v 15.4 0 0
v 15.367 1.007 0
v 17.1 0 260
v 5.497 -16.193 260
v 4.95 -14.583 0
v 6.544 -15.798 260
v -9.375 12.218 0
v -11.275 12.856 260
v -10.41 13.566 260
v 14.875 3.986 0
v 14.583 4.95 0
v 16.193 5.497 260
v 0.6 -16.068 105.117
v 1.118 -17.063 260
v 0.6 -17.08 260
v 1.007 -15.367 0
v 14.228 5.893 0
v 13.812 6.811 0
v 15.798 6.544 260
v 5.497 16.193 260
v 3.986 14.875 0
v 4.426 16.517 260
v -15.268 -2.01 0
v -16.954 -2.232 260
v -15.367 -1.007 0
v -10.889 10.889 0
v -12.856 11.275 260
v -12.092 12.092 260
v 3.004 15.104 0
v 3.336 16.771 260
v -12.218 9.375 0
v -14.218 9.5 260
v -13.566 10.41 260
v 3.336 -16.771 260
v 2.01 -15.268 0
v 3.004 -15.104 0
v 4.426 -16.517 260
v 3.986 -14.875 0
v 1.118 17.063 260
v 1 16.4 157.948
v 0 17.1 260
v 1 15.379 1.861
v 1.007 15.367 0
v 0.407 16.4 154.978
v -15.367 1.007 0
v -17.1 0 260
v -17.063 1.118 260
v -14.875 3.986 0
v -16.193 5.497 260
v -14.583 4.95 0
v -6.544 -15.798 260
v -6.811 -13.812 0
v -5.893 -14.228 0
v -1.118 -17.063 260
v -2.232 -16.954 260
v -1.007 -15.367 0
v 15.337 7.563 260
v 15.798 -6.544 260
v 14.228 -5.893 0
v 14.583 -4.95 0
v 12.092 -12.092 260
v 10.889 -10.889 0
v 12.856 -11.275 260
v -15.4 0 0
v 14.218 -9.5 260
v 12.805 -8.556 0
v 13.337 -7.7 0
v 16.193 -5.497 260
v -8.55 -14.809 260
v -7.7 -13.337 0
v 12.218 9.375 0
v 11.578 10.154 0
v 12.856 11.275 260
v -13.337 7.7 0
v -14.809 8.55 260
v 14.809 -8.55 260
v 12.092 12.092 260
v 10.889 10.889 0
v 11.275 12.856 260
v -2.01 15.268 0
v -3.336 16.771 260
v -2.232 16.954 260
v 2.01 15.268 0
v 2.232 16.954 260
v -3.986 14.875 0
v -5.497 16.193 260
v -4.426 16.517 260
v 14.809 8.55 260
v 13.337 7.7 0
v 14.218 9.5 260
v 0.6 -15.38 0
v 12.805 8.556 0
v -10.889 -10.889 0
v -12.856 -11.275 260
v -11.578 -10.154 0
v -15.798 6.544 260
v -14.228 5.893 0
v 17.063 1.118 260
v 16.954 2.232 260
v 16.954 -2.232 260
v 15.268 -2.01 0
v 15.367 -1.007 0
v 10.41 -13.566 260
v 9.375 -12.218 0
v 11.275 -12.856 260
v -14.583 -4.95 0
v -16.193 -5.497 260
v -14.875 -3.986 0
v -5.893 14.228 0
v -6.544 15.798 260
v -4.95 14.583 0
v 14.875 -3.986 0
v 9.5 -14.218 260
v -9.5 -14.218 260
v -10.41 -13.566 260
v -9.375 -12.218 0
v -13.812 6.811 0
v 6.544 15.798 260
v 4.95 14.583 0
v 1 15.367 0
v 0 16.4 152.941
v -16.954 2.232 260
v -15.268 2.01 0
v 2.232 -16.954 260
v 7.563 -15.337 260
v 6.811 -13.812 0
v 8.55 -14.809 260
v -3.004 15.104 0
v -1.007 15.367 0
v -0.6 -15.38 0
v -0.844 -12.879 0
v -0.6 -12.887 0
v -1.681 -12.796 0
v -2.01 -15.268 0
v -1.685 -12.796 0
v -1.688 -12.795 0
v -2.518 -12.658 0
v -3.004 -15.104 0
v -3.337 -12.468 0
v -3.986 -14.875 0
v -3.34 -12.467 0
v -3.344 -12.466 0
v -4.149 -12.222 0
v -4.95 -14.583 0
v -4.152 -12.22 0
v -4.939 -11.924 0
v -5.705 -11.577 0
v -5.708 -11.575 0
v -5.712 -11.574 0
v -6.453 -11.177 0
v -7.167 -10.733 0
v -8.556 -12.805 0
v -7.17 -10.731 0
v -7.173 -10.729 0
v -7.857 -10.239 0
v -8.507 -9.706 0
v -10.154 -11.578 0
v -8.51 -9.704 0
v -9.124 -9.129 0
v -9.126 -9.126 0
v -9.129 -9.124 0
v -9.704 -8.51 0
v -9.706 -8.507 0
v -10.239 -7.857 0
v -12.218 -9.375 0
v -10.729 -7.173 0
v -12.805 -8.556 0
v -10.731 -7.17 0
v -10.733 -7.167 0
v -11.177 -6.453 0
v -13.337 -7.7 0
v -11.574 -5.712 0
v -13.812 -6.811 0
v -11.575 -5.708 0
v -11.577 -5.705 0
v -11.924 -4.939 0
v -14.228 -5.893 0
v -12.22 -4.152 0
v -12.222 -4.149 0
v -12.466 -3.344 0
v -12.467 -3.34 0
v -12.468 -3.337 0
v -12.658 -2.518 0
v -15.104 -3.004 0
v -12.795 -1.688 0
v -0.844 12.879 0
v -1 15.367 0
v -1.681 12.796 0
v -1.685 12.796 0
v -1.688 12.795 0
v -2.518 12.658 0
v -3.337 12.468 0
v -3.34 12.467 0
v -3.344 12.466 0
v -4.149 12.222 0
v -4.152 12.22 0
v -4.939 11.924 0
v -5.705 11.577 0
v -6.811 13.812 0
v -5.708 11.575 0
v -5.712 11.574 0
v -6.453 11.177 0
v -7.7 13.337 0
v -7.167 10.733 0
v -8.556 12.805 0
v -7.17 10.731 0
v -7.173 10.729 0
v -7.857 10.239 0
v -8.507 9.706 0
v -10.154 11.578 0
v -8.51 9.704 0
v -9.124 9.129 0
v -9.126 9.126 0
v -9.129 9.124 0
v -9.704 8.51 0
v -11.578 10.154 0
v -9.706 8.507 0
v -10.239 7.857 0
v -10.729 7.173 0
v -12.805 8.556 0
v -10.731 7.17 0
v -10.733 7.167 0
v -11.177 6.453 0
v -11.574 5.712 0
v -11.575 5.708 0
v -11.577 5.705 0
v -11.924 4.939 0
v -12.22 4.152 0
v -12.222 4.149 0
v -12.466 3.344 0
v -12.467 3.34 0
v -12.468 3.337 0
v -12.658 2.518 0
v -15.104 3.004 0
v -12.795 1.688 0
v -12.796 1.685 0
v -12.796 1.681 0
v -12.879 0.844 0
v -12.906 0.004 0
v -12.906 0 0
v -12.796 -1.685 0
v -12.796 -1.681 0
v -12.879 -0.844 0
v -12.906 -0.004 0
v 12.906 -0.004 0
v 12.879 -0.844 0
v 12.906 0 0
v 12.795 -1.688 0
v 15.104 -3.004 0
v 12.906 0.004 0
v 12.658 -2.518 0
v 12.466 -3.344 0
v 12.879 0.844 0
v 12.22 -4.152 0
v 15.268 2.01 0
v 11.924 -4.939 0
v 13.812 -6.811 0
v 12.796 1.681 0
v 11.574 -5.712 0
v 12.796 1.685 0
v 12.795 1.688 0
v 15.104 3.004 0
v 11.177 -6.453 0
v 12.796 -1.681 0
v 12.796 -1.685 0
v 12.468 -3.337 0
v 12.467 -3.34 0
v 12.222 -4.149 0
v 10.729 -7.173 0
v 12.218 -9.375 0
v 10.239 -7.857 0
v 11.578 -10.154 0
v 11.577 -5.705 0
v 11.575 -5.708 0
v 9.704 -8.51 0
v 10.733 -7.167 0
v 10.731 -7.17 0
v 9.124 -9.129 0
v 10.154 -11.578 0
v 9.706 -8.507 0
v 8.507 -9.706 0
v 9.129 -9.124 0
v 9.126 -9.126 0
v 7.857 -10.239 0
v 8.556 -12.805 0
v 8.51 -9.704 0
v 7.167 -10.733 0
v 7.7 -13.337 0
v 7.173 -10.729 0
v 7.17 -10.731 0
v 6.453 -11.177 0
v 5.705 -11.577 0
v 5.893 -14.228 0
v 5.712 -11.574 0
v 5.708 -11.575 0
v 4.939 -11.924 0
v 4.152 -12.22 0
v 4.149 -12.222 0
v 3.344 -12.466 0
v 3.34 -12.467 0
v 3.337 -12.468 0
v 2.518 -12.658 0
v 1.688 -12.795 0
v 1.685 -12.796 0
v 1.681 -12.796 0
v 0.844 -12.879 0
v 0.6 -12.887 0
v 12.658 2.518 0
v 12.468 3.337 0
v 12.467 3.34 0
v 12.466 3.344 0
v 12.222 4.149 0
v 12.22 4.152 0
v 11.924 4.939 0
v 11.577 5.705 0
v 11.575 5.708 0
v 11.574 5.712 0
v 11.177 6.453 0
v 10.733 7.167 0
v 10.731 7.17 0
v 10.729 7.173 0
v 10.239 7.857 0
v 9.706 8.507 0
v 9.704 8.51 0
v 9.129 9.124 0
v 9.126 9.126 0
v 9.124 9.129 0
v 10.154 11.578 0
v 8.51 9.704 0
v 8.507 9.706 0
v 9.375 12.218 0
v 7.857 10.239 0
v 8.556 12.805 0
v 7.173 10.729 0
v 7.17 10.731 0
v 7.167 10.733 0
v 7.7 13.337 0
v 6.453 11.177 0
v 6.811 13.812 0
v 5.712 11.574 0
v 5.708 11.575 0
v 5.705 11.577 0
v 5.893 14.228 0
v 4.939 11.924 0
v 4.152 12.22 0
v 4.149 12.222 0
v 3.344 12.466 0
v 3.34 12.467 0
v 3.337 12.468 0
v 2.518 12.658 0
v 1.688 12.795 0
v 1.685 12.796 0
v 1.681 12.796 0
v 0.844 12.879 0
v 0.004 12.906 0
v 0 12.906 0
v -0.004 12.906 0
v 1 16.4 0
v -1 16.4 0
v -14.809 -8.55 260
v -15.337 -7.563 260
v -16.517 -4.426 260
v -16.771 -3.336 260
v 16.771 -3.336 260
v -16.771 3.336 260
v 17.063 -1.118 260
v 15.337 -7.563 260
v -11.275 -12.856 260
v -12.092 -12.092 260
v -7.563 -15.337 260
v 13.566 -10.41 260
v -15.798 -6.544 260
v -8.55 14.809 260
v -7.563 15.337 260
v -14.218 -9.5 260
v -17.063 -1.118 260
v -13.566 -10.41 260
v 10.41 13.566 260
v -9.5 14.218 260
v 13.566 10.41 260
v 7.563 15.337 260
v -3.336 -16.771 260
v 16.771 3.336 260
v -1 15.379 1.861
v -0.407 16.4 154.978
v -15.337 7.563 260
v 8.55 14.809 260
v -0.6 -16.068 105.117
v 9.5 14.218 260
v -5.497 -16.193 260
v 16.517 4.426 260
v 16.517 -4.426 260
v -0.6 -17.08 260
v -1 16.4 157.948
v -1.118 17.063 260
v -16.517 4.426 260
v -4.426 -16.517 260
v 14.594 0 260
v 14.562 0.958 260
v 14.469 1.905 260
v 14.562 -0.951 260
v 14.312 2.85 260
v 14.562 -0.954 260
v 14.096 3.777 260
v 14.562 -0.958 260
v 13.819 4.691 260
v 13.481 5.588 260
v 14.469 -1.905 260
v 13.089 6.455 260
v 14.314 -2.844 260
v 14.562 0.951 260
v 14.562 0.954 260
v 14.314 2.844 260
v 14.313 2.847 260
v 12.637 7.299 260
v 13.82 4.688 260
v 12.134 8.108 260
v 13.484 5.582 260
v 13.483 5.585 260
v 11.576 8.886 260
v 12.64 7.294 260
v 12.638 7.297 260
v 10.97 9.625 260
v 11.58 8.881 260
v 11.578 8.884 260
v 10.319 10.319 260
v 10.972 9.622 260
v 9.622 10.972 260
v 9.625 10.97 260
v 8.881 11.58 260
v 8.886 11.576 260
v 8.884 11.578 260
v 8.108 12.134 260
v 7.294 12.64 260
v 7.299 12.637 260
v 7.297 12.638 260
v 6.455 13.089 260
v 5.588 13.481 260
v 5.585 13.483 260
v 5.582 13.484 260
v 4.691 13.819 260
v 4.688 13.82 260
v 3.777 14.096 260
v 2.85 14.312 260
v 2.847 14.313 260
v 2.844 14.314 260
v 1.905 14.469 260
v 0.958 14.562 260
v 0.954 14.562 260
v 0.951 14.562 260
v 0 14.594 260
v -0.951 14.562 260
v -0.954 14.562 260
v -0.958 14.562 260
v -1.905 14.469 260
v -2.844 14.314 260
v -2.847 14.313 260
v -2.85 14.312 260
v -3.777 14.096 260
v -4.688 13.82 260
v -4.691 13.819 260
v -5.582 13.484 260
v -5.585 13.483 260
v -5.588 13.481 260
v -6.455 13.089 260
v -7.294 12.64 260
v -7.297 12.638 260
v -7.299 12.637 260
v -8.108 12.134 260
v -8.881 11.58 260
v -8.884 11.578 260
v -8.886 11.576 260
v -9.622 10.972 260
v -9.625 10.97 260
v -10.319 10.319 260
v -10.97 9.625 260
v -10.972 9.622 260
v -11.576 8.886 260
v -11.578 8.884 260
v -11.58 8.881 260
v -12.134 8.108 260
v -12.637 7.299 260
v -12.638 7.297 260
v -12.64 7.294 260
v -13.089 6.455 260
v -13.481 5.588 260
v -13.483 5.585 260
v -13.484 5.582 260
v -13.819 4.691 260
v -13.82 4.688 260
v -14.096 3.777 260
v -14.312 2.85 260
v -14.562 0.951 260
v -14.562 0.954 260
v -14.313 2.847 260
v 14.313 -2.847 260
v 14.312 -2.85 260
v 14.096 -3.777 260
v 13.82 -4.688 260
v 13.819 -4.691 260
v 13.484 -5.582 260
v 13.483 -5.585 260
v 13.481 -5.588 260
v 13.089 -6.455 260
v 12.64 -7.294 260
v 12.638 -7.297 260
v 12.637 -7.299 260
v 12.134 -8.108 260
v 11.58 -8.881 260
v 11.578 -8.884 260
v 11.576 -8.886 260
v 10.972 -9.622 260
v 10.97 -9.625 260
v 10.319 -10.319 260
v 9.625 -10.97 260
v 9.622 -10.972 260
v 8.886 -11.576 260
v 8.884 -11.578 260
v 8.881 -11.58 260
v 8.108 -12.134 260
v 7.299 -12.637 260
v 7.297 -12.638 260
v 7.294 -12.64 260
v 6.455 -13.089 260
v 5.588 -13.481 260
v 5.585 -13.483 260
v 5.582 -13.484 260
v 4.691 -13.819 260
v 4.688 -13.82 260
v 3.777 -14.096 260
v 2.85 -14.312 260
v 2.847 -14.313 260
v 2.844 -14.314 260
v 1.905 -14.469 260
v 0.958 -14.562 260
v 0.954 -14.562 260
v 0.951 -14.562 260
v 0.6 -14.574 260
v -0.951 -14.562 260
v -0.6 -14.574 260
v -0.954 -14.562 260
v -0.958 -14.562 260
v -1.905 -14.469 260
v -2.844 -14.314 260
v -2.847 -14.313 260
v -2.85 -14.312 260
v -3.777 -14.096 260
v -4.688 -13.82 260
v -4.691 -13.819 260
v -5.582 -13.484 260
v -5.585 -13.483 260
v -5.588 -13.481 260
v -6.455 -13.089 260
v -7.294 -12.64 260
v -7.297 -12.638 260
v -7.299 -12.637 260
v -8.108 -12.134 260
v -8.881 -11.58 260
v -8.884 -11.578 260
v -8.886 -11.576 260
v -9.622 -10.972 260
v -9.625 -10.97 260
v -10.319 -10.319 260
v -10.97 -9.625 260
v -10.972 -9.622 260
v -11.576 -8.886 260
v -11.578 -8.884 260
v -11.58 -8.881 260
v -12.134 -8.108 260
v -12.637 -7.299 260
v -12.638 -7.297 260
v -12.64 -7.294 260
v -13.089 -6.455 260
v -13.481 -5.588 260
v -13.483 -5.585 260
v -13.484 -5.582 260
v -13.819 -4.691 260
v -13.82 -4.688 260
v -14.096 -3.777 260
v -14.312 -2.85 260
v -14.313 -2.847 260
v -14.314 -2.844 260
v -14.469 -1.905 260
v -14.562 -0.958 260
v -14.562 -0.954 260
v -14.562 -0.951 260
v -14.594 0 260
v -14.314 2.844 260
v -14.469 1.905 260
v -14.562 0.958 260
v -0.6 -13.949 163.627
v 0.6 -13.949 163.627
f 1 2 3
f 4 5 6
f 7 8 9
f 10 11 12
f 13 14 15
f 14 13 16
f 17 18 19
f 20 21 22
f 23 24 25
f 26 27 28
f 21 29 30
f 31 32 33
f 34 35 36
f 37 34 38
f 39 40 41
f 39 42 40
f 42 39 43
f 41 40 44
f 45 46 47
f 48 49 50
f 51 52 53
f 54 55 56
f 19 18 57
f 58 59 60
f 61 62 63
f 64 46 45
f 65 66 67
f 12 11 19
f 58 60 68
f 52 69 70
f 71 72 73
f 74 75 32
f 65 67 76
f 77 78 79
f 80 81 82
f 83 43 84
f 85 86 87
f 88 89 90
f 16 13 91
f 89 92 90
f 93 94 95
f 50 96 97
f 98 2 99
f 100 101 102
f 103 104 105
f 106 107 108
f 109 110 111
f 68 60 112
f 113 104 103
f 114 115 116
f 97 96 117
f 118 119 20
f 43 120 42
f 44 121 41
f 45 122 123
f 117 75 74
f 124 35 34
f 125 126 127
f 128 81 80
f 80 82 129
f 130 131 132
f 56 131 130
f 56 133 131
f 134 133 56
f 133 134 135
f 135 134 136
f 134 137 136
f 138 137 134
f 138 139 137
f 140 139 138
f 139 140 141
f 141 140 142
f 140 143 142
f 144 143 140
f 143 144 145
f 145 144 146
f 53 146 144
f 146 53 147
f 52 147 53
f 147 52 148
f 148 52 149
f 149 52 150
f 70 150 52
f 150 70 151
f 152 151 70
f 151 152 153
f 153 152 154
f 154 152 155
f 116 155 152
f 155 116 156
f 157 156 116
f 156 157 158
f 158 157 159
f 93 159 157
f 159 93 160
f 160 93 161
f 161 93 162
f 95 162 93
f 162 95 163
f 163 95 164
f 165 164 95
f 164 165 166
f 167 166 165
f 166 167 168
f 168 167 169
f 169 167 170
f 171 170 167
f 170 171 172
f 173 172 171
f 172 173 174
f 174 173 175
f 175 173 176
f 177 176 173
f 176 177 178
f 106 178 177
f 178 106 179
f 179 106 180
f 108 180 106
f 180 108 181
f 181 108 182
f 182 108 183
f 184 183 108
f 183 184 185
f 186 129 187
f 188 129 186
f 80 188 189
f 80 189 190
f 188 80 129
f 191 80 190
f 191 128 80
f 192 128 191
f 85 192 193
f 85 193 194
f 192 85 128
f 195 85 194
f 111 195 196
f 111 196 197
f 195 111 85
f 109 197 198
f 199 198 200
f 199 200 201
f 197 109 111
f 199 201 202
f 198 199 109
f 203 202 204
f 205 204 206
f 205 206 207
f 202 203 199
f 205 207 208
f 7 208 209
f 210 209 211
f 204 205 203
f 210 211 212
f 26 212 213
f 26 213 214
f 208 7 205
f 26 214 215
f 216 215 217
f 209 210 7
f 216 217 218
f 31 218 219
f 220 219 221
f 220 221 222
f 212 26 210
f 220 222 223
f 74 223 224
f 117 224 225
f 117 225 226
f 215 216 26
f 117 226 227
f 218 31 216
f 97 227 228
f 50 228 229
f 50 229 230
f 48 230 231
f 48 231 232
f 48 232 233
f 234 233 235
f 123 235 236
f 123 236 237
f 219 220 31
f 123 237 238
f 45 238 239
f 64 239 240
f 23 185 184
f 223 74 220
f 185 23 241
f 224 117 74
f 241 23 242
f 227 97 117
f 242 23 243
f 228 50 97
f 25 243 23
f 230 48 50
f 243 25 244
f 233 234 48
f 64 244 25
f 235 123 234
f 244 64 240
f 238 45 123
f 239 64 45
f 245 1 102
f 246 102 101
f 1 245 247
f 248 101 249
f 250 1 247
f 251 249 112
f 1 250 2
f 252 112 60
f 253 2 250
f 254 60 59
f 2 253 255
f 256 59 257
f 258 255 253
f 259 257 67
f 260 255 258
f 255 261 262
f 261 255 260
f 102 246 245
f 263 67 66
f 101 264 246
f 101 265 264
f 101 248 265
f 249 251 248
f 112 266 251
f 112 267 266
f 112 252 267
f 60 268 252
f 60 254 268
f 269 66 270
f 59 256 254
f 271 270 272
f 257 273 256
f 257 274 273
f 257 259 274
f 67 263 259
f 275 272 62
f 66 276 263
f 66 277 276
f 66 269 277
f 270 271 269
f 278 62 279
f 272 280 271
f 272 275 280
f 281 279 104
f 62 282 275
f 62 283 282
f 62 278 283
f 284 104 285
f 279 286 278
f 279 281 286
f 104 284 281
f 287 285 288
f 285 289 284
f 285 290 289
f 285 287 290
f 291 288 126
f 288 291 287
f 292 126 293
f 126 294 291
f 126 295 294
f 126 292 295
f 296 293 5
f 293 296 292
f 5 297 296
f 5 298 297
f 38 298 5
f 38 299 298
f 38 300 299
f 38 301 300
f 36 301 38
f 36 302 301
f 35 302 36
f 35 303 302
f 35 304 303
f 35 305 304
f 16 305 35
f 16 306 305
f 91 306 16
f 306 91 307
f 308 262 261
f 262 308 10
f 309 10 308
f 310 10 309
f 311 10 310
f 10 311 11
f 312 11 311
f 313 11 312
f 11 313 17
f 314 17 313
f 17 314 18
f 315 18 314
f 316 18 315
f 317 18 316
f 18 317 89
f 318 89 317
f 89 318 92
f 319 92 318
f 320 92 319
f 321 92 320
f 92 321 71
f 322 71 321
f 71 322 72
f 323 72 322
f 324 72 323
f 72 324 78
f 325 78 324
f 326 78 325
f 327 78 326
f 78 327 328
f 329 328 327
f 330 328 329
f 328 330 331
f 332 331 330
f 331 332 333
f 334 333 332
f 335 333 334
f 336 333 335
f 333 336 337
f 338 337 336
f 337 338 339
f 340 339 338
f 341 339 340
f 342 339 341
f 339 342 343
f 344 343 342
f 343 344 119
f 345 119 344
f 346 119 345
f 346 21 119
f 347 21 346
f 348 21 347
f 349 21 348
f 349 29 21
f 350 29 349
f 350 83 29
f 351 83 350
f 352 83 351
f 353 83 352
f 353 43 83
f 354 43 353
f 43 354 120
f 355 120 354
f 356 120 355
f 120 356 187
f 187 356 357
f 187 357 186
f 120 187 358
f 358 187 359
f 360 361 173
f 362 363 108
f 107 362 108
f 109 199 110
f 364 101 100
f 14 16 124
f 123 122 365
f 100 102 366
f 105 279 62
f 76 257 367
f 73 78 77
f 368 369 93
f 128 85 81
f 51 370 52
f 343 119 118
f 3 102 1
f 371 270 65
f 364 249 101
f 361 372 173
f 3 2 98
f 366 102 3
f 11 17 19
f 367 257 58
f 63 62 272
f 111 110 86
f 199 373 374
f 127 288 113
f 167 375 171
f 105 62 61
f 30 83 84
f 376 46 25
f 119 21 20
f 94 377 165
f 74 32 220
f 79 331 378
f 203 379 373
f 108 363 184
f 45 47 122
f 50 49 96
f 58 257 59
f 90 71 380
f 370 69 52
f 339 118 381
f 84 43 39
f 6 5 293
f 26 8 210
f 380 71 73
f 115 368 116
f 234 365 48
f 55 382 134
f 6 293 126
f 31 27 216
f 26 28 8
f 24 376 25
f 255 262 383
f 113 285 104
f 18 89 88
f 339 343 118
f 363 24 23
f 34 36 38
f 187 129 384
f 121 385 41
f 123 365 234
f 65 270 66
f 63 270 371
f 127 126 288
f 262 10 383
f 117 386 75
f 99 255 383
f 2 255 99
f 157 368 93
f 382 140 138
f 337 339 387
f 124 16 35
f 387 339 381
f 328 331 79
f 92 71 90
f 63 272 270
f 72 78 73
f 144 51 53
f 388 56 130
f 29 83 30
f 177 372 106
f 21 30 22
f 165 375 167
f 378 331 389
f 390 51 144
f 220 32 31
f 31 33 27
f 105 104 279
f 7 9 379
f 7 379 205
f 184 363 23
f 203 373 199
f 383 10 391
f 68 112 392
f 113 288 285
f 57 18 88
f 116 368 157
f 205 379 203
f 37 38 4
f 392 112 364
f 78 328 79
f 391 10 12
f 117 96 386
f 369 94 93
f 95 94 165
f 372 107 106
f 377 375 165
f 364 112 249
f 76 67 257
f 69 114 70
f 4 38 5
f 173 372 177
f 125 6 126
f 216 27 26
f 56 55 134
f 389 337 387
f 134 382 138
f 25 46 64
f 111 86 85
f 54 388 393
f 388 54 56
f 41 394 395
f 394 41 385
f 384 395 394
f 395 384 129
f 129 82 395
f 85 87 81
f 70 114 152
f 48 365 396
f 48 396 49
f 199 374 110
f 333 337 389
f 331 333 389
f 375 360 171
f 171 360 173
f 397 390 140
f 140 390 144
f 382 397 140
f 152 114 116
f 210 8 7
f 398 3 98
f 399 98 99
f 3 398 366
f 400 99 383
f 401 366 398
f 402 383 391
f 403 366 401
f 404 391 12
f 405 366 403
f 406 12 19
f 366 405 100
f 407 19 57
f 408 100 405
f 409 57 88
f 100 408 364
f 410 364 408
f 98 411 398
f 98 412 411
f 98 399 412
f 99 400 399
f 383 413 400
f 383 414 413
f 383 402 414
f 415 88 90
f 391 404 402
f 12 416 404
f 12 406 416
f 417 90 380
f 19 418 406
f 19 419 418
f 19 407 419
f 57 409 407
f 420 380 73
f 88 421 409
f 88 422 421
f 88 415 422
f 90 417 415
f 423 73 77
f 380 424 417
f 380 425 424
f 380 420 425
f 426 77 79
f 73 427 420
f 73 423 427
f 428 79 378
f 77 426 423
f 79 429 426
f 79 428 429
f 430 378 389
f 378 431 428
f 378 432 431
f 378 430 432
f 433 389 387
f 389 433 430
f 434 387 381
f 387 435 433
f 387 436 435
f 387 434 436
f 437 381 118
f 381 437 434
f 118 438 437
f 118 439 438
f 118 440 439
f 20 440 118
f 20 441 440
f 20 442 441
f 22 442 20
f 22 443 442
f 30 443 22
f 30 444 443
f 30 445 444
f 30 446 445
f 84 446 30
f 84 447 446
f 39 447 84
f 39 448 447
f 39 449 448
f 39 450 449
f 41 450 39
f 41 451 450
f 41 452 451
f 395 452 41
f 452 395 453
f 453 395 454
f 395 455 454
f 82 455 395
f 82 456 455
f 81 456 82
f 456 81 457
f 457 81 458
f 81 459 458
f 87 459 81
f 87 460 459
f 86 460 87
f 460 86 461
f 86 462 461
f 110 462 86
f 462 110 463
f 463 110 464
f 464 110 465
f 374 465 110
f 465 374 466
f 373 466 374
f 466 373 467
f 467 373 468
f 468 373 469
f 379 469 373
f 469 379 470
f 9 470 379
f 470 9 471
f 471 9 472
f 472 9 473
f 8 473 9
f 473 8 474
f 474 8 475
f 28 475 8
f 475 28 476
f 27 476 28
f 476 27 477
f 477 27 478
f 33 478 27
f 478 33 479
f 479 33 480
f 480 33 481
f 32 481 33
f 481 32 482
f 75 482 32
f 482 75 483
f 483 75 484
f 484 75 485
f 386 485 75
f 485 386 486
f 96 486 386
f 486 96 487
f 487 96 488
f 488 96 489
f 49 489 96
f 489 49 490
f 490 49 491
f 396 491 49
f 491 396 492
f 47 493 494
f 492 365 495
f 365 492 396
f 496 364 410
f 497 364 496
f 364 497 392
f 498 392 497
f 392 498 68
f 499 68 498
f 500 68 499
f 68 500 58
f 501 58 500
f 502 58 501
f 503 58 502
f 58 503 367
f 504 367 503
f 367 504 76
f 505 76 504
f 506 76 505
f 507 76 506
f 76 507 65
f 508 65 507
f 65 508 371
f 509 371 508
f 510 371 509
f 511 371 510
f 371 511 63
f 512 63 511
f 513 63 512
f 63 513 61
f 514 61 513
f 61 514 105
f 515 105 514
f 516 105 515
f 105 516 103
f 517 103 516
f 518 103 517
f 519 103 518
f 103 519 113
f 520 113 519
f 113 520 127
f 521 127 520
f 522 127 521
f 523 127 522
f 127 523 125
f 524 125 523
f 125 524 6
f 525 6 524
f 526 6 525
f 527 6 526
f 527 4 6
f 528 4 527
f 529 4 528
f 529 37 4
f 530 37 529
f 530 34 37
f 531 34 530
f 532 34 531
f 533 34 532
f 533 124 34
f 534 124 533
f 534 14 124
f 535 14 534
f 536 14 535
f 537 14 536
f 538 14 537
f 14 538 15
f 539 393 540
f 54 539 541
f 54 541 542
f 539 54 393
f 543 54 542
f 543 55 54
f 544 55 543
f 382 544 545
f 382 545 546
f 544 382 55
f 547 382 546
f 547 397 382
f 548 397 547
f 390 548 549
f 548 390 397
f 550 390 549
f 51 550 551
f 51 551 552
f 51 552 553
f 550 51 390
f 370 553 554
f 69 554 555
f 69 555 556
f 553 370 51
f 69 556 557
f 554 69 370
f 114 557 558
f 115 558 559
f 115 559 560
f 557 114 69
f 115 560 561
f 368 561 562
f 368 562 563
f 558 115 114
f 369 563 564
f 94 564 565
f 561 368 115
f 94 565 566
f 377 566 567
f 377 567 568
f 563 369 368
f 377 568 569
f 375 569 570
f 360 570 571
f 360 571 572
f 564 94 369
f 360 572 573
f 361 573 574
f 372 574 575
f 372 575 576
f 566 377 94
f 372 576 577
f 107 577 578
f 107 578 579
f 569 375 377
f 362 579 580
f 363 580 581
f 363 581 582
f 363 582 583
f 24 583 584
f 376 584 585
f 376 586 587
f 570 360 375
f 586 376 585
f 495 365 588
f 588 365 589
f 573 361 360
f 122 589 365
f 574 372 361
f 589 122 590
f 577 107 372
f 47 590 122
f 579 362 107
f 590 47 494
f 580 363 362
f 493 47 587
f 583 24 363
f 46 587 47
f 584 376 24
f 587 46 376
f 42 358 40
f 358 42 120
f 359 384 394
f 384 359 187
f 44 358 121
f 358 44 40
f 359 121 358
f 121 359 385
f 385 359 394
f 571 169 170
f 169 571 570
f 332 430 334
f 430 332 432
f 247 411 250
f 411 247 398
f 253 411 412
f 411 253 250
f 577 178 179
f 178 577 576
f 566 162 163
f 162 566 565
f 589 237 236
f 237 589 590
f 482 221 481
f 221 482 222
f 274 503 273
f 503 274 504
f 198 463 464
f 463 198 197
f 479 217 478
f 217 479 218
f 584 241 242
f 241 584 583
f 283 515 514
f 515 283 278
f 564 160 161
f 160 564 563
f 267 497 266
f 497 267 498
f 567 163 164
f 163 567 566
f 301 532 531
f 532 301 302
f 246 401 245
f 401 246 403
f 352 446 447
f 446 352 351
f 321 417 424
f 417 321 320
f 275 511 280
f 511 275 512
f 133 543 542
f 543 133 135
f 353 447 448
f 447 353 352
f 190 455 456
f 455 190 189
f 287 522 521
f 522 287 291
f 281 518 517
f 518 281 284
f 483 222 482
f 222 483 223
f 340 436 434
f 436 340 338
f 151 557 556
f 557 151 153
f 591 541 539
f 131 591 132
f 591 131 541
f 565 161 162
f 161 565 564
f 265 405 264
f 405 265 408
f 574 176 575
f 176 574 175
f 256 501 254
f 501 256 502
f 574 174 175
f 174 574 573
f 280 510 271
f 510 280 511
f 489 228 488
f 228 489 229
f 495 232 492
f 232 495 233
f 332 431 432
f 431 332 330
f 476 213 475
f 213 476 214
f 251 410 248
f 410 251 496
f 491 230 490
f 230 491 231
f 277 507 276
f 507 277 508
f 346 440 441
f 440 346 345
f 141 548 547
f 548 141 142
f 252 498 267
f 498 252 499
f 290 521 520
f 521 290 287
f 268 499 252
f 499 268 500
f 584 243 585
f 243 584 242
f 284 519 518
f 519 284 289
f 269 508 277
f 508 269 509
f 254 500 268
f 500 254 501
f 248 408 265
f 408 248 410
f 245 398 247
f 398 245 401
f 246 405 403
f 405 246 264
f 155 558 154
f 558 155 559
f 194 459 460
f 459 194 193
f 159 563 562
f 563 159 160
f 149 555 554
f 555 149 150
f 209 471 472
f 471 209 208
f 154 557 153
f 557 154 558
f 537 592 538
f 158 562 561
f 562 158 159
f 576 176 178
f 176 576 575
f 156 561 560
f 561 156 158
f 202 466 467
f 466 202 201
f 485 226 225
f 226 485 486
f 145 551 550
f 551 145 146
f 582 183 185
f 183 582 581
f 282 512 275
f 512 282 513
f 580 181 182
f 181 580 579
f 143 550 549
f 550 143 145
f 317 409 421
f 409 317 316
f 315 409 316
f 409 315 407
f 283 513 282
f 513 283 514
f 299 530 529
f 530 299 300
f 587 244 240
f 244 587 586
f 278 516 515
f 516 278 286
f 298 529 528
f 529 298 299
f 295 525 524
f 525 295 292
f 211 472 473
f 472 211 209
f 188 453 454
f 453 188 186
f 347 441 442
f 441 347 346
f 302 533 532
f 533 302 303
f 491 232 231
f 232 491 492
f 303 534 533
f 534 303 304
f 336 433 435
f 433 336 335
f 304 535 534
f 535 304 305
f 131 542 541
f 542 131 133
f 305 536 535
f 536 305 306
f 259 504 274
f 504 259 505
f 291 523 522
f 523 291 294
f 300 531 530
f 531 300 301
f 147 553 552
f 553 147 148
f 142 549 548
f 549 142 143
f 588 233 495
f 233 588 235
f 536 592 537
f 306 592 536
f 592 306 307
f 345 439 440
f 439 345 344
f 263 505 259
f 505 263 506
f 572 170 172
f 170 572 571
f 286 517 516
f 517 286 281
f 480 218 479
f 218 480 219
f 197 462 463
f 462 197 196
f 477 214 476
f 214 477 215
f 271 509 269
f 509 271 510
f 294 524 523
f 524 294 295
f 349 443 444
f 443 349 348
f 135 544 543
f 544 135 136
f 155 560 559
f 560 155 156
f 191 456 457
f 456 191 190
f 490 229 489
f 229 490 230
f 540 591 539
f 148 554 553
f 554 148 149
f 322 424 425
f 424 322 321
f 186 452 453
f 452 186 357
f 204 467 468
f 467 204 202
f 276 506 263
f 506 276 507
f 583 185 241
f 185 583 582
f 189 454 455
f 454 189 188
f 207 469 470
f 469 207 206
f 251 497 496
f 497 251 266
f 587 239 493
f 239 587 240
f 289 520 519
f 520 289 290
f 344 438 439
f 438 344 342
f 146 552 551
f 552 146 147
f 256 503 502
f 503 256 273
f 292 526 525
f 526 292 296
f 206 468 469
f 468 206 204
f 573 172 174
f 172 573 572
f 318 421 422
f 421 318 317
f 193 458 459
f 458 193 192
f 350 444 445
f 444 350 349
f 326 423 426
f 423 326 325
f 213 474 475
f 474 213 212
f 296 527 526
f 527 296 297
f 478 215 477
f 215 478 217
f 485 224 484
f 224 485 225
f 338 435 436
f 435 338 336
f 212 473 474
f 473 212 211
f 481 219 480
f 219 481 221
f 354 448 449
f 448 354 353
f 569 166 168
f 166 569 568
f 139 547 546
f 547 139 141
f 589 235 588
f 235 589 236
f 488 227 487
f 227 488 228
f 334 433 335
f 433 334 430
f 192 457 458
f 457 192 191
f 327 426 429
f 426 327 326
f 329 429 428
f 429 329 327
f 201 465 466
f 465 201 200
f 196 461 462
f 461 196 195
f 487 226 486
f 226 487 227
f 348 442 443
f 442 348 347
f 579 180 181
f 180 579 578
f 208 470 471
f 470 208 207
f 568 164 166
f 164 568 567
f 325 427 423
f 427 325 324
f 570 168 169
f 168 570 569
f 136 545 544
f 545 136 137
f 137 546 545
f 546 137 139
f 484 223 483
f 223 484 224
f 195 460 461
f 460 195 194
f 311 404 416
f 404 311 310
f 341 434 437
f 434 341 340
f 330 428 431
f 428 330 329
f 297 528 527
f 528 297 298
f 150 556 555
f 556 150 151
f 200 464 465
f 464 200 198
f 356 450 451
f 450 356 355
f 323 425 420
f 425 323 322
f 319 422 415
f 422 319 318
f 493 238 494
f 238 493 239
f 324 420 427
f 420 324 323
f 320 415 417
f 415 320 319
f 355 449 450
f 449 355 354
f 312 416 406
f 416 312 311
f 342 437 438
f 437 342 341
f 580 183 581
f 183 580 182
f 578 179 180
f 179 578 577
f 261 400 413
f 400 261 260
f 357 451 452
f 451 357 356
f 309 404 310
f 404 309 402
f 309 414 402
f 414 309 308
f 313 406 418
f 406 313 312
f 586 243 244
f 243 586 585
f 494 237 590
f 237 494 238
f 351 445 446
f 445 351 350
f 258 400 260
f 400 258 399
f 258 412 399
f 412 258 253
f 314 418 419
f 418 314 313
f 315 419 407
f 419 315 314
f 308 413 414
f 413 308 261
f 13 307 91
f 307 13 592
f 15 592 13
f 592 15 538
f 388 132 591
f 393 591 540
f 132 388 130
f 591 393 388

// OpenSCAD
// file: params.scad
// ===========================================================================
// CueCam - shared parameters
// Every printed part in this folder is driven from here. Change a number,
// re-export, reprint. Units: mm.
// ===========================================================================

/* [Cue geometry] */
CUE_LEN        = 1473.2;   // 58 in
JOINT1_X       = 482.6;    // 19 in - the "one third from the tip" station
SHAFT_DIA_AT_J1= 14.2;     // cue diameter where the collar starts

/* [Camera collar] -------------------------------------------------------- */
// POD_OD is THE parameter. 24 suits a 16 mm-wide custom PCB; use 29 for a
// de-cased RunCam Thumb Pro. Anything over 30 is unplayable - see docs.
POD_OD         = 24.0;
COLLAR_LEN     = 117.4;
COLLAR_WALL    = 2.0;
BAY_LEN        = 70.0;     // cartridge bay
BAY_DIA        = 19.2;     // bay bore
LEAD_IN        = 29.4;     // front blend length
LEAD_OUT       = 38.0;     // rear blend length

/* [Bayonet] -------------------------------------------------------------- */
BAY_LUGS       = 2;        // lugs, equally spaced
LUG_W          = 4.0;      // circumferential width
LUG_H          = 1.8;      // radial height
LUG_T          = 3.0;      // axial thickness
BAYONET_ANGLE  = 28;       // degrees of twist to lock
DETENT_R       = 0.55;     // detent bump radius
EJECT_TRAVEL   = 9.0;      // how far the spring pushes the cartridge out

/* [Cartridge] ------------------------------------------------------------ */
CART_OD        = 18.6;     // slides in BAY_DIA with the boot around it
CART_WALL      = 1.2;
PCB_W          = 16.0;
PCB_T          = 1.6;
PCB_L          = 58.0;
CELL_W         = 20.0;     // LiPo 402040
CELL_T         = 4.0;
CELL_L         = 40.0;
SD_W           = 11.0;
SD_T           = 1.0;

/* [Optics] --------------------------------------------------------------- */
LENS_R         = 11.0;     // lens height above the cue axis
LENS_BORE      = 8.0;      // M12 lens barrel clearance
WINDOW_W       = 6.0;
WINDOW_H       = 4.0;
WINDOW_T       = 0.8;
// Max nose-down tilt before the cue's own shaft blocks the axis is 0.67 deg
// (tools/optics.py). So: zero. The lens looks straight down the cue.
LENS_TILT      = 0.0;

/* [Butt] ----------------------------------------------------------------- */
BUTT_OD        = 29.5;
BUTT_WALL      = 1.4;
BOLT_BORE_DIA  = 8.0;      // 5/16-14 clearance
BOLT_BORE_LEN  = 190.0;    // long on purpose: halves the balance swing
CAP_LEN        = 26.0;
BUMPER_THREAD  = 12.0;     // M12x1, LEFT hand

/* [Grip] ----------------------------------------------------------------- */
GRIP_LEN       = 260.0;
GRIP_WALL      = 2.6;
GRIP_SPLIT     = 1.2;      // split width so it springs over the butt
INDEX_RIB_W    = 2.0;      // tells your hand where the lens is

/* [Tip] ------------------------------------------------------------------ */
TIP_DIA        = 9.5;
FERRULE_LEN    = 13.0;
FERRULE_BORE   = 6.3;
STUD           = "4-40";   // #4-40 UNC, 2.845 mm major

/* [Print] ---------------------------------------------------------------- */
FIT            = 0.20;     // clearance on sliding fits, PA6-CF on a P1S
PRESS          = 0.05;     // interference on bonded fits
$fn            = 96;
// file: lib.scad
// Small helpers shared by the CueCam parts.
include <params.scad>;

// A solid of revolution from a list of [x, radius] points.
module revolve(profile, fn = $fn) {
    rotate_extrude($fn = fn)
        polygon(concat([[0, profile[0][0]]],
                       [for (p = profile) [p[1], p[0]]],
                       [[0, profile[len(profile) - 1][0]]]));
}

// Smootherstep, the same blend the drawings use, so printed parts and
// drawings agree on the collar silhouette.
function blend(t) = let (u = max(0, min(1, t))) u*u*u*(u*(u*6 - 15) + 10);

function collar_r(x) =
      x <= LEAD_IN
    ? (SHAFT_DIA_AT_J1 + (POD_OD - SHAFT_DIA_AT_J1) * blend(x / LEAD_IN)) / 2
    : x <= COLLAR_LEN - LEAD_OUT
    ? POD_OD / 2
    : (POD_OD + (15.9 - POD_OD)
        * blend((x - (COLLAR_LEN - LEAD_OUT)) / LEAD_OUT)) / 2;

function collar_profile(n = 80) =
    [for (i = [0 : n]) let (x = COLLAR_LEN * i / n) [x, collar_r(x)]];

// A bayonet track cut: axial entry, then a circumferential run to a detent.
module bayonet_track(r, angle = BAYONET_ANGLE, w = LUG_W + 2*FIT,
                     t = LUG_T + 2*FIT, depth = LUG_H + FIT) {
    // axial entry slot
    translate([0, 0, -0.1]) rotate([0, 0, -w/2 / (PI*r) * 180])
        rotate_extrude(angle = w / (PI * r) * 180, $fn = 128)
            translate([r - depth, 0]) square([depth + 1, t + 2]);
    // circumferential run
    translate([0, 0, t - 0.1])
        rotate_extrude(angle = angle, $fn = 128)
            translate([r - depth, 0]) square([depth + 1, w]);
}

module knurl(r, h, n = 36, d = 0.6) {
    for (i = [0 : n - 1]) rotate([0, 0, i * 360 / n])
        translate([r, 0, 0]) cylinder(h = h, d = d, $fn = 8);
}
// main file
// ===========================================================================
// Split TPU grip sleeve. Springs over the butt, trapped by the butt-cap
// shoulder. Print in three durometers and decide with the cue in your hand.
// The index rib runs along the same clock position as the lens.
// ===========================================================================
include <lib.scad>;

D_AT_TOP = 25.6;   // butt diameter where the grip starts
D_AT_BOT = 29.0;

difference() {
    union() {
        cylinder(h = GRIP_LEN, d1 = D_AT_TOP + 2*GRIP_WALL,
                               d2 = D_AT_BOT + 2*GRIP_WALL);
        // index rib - tells your hand which way the lens is pointing
        translate([0, 0, 0]) rotate([0, 0, 0])
            translate([-INDEX_RIB_W/2, D_AT_TOP/2, 0])
                cube([INDEX_RIB_W, GRIP_WALL + 1.0, GRIP_LEN]);
    }
    translate([0, 0, -1]) cylinder(h = GRIP_LEN + 2, d1 = D_AT_TOP + FIT,
                                                     d2 = D_AT_BOT + FIT);
    // the split, opposite the index rib
    translate([-GRIP_SPLIT/2, -D_AT_BOT, -1])
        cube([GRIP_SPLIT, D_AT_BOT, GRIP_LEN + 2]);
}
